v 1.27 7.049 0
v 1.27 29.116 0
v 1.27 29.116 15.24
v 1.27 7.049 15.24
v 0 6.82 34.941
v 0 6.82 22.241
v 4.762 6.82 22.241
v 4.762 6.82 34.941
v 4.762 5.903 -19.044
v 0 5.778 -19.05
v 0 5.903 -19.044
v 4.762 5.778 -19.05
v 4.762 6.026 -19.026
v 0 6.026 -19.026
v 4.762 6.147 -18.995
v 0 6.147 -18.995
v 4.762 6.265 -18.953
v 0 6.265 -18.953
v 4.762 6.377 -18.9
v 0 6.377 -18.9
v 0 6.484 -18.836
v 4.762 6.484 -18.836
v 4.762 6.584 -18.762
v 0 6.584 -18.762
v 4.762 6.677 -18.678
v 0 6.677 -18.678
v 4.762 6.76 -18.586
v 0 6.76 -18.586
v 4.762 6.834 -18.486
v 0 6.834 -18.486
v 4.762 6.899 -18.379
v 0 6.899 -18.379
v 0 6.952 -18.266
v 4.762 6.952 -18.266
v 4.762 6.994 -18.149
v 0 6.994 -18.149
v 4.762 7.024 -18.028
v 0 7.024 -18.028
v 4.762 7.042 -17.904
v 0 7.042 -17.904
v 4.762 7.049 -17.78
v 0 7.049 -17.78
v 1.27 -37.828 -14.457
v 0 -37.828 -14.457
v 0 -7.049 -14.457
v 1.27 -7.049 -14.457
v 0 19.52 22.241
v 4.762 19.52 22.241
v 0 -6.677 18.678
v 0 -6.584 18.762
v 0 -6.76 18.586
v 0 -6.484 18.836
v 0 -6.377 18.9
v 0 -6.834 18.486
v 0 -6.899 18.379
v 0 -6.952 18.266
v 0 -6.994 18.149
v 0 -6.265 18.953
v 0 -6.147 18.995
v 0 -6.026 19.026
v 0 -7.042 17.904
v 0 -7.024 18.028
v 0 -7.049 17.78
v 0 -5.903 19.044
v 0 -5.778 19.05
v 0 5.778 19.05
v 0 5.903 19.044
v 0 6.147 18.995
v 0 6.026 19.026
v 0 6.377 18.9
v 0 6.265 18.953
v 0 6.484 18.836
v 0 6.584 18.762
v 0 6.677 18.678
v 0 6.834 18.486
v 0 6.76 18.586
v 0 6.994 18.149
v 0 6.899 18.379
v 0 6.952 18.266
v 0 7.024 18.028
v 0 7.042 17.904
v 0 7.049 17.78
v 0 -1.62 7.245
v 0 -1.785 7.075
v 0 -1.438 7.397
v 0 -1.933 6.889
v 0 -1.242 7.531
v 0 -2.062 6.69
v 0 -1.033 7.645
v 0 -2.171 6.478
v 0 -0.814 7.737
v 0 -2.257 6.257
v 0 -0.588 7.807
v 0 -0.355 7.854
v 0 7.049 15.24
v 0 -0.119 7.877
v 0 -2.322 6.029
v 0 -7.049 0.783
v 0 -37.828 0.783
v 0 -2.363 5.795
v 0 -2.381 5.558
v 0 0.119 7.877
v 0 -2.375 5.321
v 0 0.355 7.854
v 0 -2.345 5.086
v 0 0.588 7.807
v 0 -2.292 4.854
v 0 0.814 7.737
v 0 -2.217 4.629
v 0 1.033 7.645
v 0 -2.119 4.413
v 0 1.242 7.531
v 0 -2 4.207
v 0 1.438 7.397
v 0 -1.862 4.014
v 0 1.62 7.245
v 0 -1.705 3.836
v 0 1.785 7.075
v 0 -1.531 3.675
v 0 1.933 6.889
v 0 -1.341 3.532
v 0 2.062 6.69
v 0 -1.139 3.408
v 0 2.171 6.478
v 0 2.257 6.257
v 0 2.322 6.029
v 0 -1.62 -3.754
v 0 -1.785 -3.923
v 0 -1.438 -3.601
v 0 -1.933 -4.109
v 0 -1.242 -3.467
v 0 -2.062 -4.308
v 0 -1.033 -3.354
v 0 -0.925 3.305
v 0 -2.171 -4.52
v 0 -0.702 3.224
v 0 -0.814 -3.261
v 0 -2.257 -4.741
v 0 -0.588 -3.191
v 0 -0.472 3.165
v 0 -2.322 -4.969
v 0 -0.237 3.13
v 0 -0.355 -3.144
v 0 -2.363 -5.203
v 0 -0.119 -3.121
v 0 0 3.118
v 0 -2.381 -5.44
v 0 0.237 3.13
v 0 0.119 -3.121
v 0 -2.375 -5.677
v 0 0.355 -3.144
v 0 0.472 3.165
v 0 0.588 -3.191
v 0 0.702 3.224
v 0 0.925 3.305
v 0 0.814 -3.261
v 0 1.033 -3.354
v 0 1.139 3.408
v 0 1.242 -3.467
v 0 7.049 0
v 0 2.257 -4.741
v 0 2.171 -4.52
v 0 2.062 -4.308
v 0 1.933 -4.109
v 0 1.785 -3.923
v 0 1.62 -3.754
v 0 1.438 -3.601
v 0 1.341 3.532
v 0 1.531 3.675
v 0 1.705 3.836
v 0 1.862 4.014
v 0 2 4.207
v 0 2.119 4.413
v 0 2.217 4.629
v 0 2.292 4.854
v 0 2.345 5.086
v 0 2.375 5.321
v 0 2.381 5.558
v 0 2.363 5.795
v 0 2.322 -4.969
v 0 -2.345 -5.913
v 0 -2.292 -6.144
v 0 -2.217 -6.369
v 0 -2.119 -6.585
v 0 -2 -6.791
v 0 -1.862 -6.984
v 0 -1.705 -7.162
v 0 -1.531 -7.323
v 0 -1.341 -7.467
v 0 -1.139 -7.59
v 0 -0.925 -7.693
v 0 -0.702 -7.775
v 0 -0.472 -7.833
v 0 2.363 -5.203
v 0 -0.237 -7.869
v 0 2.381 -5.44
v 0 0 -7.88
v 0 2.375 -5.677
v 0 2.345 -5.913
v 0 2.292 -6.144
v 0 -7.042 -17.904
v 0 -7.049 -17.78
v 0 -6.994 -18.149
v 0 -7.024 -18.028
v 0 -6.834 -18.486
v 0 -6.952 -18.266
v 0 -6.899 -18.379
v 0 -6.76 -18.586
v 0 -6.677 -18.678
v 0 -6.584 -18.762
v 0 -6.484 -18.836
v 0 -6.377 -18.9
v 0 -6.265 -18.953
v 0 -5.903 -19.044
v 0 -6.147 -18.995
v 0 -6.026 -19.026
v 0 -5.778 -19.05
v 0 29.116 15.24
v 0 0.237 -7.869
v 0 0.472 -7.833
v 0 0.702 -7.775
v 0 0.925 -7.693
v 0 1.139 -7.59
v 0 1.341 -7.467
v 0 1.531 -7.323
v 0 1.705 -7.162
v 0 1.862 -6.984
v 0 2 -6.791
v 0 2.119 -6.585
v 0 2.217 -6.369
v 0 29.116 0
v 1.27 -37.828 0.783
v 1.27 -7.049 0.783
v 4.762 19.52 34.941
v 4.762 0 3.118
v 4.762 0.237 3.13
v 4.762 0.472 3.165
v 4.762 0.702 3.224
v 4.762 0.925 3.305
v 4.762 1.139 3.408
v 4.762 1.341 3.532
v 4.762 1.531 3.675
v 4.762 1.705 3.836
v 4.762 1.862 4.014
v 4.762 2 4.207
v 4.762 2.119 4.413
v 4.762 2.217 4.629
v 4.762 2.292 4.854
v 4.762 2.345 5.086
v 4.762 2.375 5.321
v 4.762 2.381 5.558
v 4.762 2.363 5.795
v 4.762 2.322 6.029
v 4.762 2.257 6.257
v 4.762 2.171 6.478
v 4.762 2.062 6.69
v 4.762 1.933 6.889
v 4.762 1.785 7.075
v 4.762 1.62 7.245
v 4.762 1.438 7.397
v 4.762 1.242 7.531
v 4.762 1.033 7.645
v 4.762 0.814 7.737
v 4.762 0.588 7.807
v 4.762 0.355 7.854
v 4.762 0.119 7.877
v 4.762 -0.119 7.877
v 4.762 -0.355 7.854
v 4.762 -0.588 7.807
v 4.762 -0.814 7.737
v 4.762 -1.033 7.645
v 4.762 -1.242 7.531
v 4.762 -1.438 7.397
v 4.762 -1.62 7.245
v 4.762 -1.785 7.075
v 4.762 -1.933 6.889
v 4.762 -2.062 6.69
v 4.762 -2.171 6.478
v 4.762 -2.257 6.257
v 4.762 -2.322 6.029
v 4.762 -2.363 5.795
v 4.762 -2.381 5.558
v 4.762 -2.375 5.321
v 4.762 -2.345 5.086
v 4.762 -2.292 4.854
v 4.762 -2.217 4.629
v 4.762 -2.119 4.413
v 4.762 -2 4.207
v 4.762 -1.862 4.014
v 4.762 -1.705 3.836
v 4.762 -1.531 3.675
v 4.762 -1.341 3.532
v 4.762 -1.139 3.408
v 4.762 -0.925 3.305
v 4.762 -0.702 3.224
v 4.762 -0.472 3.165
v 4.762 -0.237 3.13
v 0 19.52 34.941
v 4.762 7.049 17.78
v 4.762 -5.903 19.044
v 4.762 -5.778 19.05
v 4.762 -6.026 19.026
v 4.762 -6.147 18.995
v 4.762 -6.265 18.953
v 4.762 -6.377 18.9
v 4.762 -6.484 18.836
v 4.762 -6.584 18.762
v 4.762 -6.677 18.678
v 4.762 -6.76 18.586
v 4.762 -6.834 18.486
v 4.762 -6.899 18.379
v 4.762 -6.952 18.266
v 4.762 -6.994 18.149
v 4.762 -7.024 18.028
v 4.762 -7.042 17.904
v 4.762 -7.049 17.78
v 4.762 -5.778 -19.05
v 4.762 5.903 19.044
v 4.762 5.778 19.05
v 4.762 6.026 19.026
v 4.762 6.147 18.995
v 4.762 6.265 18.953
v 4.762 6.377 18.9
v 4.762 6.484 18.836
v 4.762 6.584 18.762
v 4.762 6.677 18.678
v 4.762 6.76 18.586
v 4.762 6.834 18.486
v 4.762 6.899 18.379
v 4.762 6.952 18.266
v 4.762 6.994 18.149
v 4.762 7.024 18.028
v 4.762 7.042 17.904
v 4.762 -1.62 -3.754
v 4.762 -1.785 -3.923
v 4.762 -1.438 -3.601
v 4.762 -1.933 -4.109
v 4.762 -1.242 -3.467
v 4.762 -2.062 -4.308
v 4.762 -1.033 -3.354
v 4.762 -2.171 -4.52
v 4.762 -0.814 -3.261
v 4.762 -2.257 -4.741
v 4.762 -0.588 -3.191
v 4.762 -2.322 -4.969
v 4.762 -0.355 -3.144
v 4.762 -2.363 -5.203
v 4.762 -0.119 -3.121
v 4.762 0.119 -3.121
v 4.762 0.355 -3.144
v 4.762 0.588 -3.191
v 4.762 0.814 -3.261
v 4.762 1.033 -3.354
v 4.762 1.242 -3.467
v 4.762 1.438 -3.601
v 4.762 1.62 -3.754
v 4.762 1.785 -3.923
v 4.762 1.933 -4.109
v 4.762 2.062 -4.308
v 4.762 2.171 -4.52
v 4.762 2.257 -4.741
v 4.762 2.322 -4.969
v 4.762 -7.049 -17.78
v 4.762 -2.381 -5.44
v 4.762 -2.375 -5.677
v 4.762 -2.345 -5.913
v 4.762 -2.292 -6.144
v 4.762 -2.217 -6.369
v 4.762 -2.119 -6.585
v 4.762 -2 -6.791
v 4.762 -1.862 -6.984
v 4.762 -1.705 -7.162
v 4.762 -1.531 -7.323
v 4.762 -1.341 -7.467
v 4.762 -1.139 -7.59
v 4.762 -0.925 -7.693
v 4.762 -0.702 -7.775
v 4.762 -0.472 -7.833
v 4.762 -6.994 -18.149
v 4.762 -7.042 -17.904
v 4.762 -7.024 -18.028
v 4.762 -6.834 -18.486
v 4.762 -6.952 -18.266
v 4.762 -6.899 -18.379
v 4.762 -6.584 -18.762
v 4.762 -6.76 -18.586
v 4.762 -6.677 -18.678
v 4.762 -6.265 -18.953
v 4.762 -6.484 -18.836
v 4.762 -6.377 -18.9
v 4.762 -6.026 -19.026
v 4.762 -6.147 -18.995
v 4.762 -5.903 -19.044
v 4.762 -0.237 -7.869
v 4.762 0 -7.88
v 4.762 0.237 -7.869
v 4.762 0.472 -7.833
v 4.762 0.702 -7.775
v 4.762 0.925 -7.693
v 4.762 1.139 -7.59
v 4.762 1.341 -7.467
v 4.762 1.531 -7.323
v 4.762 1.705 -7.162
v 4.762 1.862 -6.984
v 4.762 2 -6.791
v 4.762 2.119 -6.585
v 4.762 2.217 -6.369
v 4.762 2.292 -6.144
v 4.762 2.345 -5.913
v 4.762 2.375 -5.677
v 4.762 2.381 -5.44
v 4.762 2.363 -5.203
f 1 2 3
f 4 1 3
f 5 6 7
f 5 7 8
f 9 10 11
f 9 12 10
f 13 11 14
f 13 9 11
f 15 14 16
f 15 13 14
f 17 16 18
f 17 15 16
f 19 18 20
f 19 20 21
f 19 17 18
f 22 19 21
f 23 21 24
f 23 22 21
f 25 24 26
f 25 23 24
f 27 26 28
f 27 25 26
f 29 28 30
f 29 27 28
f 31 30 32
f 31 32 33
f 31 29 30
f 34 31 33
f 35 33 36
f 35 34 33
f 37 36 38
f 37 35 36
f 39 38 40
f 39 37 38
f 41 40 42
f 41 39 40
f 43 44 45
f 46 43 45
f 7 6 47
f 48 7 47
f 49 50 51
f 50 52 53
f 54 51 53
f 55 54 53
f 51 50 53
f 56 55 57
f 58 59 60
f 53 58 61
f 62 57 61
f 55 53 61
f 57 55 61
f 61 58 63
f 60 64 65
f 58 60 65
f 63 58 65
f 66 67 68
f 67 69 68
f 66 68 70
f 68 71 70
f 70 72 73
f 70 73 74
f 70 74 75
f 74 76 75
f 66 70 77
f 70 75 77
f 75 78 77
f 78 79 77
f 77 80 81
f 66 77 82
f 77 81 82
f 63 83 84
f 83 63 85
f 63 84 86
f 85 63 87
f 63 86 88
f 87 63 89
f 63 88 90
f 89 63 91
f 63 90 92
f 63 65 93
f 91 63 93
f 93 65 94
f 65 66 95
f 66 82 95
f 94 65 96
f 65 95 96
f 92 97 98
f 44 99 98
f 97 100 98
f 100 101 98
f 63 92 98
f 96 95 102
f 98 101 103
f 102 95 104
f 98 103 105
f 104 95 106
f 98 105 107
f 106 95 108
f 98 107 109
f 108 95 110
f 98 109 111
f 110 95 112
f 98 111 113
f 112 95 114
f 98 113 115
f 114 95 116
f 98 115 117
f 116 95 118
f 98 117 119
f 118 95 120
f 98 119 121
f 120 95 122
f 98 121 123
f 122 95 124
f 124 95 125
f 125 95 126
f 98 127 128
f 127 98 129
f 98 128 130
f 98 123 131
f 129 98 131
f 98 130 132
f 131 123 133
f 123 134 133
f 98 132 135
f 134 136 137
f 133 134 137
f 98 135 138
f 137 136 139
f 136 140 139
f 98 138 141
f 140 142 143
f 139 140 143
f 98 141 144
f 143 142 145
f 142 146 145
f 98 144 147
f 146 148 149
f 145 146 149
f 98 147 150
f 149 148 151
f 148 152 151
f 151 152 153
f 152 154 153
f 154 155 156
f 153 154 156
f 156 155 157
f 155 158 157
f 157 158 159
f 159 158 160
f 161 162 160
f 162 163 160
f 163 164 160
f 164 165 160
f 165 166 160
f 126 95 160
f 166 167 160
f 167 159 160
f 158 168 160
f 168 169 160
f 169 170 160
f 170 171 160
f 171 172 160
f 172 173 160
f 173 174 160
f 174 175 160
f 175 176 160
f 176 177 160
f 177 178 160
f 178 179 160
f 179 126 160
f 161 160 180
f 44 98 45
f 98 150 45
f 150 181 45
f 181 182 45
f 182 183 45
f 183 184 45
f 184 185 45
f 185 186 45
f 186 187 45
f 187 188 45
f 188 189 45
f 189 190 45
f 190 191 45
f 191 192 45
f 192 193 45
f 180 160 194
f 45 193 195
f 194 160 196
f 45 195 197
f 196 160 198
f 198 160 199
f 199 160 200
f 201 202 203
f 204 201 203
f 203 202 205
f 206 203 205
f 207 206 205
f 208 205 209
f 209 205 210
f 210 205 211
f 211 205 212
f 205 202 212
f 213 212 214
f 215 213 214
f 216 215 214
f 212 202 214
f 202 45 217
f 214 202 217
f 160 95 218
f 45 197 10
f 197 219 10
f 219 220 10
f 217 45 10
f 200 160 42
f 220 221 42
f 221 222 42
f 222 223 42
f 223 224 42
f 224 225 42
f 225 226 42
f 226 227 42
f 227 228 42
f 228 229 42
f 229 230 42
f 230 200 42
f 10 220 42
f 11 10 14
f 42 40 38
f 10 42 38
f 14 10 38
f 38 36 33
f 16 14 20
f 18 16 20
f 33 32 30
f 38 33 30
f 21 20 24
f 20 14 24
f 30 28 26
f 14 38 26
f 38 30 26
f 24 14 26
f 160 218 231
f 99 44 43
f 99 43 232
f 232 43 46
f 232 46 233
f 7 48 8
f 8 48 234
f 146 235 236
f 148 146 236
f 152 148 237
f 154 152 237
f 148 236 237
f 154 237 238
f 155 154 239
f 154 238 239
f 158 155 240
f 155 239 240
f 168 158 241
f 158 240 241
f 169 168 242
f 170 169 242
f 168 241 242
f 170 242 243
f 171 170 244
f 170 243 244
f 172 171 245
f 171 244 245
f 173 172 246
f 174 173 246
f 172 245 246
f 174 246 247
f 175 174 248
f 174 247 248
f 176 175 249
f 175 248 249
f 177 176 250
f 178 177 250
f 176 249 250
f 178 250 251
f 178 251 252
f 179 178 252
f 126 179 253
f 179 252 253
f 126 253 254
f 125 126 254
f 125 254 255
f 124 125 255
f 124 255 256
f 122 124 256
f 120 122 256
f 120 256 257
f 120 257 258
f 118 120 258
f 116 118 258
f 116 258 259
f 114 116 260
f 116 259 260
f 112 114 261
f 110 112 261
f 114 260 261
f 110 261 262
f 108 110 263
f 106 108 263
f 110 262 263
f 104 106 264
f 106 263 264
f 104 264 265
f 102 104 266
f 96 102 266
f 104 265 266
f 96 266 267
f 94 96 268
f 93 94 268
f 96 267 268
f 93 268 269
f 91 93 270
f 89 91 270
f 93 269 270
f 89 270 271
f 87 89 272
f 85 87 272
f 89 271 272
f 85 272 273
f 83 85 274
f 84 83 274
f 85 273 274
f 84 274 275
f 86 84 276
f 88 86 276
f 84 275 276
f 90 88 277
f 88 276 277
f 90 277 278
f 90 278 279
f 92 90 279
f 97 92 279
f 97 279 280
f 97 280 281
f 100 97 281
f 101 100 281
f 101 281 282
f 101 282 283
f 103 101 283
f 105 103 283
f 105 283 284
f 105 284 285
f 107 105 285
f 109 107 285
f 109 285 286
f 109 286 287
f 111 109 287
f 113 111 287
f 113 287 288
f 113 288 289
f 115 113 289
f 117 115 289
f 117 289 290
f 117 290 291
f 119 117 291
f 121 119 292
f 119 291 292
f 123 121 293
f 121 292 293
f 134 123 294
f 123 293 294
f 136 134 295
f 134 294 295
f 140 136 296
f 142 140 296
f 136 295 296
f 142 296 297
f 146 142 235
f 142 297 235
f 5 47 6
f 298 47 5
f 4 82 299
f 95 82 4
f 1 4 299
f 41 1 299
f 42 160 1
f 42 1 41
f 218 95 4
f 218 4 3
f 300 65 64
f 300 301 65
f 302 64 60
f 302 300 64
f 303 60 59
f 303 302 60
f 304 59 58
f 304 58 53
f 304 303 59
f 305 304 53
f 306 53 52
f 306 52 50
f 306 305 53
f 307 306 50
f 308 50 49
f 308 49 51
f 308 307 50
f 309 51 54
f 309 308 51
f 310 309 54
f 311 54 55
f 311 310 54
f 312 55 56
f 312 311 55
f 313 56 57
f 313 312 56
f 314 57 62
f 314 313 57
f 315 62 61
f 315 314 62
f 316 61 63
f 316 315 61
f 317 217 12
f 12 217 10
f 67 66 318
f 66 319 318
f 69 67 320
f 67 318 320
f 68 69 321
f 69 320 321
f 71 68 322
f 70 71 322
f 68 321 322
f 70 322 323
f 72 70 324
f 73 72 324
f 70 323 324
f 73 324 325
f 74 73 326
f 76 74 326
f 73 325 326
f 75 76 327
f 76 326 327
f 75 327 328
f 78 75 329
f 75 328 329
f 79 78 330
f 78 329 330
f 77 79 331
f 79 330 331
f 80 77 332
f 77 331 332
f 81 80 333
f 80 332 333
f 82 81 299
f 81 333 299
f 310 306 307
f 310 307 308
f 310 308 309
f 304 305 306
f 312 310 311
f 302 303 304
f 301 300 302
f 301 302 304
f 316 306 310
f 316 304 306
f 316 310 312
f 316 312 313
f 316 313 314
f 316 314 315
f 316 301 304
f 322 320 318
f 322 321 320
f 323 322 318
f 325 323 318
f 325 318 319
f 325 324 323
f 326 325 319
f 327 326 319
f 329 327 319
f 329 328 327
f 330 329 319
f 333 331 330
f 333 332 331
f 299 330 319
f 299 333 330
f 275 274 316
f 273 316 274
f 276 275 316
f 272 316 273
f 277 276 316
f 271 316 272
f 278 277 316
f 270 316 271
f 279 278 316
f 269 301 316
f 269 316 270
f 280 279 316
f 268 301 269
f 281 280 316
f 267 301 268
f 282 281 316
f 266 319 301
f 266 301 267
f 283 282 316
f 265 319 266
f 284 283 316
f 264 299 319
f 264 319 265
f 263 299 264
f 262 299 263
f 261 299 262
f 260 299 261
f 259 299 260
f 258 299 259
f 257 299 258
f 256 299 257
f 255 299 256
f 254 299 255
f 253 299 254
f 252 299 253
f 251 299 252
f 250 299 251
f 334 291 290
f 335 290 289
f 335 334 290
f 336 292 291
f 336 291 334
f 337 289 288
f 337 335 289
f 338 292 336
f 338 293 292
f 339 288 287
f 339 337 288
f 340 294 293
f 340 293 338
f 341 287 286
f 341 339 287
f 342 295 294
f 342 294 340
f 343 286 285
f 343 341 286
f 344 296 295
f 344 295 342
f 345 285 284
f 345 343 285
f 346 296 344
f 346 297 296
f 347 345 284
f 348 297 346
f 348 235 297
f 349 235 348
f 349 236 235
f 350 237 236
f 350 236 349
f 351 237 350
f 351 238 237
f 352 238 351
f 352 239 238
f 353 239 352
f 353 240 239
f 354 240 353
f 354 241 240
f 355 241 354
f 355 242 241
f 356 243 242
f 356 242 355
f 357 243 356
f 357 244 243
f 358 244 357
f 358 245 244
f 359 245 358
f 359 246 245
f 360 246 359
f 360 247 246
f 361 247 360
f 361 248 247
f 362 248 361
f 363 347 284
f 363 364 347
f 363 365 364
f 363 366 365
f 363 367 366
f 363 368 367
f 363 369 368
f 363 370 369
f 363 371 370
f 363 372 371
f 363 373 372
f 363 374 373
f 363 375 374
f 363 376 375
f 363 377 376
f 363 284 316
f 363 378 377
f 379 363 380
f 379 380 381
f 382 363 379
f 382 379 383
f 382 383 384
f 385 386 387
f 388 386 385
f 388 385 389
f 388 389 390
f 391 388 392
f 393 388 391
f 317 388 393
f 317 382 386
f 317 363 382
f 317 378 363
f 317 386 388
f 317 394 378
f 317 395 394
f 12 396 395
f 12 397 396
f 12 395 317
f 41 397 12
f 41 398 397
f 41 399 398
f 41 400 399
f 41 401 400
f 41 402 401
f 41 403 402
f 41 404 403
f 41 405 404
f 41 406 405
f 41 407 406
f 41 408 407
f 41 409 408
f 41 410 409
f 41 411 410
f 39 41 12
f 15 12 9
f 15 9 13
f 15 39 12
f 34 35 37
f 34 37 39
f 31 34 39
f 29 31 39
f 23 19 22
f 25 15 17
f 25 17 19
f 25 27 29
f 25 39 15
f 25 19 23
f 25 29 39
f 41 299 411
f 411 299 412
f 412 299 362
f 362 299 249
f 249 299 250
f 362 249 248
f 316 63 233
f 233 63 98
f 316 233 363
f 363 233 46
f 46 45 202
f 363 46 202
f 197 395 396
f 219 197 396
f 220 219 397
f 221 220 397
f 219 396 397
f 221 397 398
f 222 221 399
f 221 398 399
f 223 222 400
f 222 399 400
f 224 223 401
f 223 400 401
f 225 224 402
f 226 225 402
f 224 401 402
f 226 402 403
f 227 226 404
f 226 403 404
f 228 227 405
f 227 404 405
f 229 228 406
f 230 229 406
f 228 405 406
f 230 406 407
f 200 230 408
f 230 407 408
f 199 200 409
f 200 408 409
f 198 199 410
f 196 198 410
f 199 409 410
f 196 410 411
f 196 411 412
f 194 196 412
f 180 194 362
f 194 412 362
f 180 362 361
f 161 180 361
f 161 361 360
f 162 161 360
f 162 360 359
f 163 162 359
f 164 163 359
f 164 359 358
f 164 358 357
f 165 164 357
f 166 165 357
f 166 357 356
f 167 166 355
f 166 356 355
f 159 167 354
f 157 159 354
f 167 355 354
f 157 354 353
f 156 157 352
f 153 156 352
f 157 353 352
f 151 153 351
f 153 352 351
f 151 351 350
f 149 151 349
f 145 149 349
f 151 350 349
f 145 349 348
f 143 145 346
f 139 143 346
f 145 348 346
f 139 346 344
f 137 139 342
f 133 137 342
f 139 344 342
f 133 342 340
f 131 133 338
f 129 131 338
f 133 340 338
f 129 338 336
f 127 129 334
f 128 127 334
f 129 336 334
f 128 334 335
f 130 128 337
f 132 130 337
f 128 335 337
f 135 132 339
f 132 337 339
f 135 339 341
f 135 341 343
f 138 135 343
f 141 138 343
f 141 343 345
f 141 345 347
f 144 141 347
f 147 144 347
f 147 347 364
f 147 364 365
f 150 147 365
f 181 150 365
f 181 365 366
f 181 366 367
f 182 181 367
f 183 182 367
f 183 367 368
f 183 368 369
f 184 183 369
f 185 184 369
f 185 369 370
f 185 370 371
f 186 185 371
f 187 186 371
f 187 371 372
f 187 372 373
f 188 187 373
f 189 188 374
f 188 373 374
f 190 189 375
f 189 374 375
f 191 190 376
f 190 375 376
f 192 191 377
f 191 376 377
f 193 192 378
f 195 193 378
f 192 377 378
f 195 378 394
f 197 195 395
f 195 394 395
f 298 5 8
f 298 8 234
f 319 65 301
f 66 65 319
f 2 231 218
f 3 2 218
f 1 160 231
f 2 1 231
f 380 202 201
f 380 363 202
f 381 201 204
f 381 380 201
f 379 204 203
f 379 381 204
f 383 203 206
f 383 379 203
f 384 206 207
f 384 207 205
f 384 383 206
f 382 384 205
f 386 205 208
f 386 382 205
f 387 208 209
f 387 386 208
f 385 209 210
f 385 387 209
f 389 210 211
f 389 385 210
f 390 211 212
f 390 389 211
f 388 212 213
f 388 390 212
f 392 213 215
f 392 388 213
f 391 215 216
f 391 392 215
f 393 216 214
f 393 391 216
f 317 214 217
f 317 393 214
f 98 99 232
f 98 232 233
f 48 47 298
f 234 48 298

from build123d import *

# Parameters (mm, degrees)
SKETCH1_W           = 38.1
SKETCH1_H           = 14.097
BOSS_EXTRUDE1_DEPTH = 4.7625
FILLET1_R           = 1.27
SKETCH2_R           = 2.38125
CUT_EXTRUDE1_DEPTH  = 4.7625
SKETCH3_W           = 12.7
SKETCH3_H           = 12.7
BOSS_EXTRUDE2_DEPTH = 4.7625
SKETCH4_W           = 15.24
SKETCH4_H           = 22.067088611
SKETCH4_H_2         = 30.779638622
BOSS_EXTRUDE3_DEPTH = 1.27


with BuildPart() as part:
    # Sketch1 → Boss-Extrude1 (new body)
    with BuildSketch(Plane(origin=(0, 0, 0), x_dir=(0, 0, -1), z_dir=(1, 0, 0))):
        Rectangle(SKETCH1_W, SKETCH1_H)
    extrude(amount=BOSS_EXTRUDE1_DEPTH)

    # Fillet1
    fillet1_edges = [part.edges().sort_by_distance(p)[0] for p in [
        (2.38125, 7.0485, 19.05),
        (2.38125, 7.0485, -19.05),
        (2.38125, -7.0485, -19.05),
        (2.38125, -7.0485, 19.05),
    ]]
    fillet(fillet1_edges, radius=FILLET1_R)

    # Sketch2 → Cut-Extrude1 (cut)
    with BuildSketch(Plane(origin=(4.7625, 0, 0), x_dir=(0, 0, -1), z_dir=(1, 0, 0))):
        with Locations((-5.4991, 0)):
            Circle(SKETCH2_R)
        with Locations((5.4991, 0)):
            Circle(SKETCH2_R)
    extrude(amount=-CUT_EXTRUDE1_DEPTH, mode=Mode.SUBTRACT)

    # Sketch4 → Boss-Extrude3 (add)
    with BuildSketch(Plane.ZY):
        with Locations((7.62, 18.082044306)):
            Rectangle(SKETCH4_W, SKETCH4_H)
        with Locations((-6.836682106, -22.438319311)):
            Rectangle(SKETCH4_W, SKETCH4_H_2)
    extrude(amount=-BOSS_EXTRUDE3_DEPTH)


with BuildPart() as body_2:
    # Sketch3 → Boss-Extrude2 (new body)
    with BuildSketch(Plane.ZY):
        with Locations((28.59110019, 13.170447646)):
            Rectangle(SKETCH3_W, SKETCH3_H)
    extrude(amount=-BOSS_EXTRUDE2_DEPTH)


solid = Compound([part.part, body_2.part])
